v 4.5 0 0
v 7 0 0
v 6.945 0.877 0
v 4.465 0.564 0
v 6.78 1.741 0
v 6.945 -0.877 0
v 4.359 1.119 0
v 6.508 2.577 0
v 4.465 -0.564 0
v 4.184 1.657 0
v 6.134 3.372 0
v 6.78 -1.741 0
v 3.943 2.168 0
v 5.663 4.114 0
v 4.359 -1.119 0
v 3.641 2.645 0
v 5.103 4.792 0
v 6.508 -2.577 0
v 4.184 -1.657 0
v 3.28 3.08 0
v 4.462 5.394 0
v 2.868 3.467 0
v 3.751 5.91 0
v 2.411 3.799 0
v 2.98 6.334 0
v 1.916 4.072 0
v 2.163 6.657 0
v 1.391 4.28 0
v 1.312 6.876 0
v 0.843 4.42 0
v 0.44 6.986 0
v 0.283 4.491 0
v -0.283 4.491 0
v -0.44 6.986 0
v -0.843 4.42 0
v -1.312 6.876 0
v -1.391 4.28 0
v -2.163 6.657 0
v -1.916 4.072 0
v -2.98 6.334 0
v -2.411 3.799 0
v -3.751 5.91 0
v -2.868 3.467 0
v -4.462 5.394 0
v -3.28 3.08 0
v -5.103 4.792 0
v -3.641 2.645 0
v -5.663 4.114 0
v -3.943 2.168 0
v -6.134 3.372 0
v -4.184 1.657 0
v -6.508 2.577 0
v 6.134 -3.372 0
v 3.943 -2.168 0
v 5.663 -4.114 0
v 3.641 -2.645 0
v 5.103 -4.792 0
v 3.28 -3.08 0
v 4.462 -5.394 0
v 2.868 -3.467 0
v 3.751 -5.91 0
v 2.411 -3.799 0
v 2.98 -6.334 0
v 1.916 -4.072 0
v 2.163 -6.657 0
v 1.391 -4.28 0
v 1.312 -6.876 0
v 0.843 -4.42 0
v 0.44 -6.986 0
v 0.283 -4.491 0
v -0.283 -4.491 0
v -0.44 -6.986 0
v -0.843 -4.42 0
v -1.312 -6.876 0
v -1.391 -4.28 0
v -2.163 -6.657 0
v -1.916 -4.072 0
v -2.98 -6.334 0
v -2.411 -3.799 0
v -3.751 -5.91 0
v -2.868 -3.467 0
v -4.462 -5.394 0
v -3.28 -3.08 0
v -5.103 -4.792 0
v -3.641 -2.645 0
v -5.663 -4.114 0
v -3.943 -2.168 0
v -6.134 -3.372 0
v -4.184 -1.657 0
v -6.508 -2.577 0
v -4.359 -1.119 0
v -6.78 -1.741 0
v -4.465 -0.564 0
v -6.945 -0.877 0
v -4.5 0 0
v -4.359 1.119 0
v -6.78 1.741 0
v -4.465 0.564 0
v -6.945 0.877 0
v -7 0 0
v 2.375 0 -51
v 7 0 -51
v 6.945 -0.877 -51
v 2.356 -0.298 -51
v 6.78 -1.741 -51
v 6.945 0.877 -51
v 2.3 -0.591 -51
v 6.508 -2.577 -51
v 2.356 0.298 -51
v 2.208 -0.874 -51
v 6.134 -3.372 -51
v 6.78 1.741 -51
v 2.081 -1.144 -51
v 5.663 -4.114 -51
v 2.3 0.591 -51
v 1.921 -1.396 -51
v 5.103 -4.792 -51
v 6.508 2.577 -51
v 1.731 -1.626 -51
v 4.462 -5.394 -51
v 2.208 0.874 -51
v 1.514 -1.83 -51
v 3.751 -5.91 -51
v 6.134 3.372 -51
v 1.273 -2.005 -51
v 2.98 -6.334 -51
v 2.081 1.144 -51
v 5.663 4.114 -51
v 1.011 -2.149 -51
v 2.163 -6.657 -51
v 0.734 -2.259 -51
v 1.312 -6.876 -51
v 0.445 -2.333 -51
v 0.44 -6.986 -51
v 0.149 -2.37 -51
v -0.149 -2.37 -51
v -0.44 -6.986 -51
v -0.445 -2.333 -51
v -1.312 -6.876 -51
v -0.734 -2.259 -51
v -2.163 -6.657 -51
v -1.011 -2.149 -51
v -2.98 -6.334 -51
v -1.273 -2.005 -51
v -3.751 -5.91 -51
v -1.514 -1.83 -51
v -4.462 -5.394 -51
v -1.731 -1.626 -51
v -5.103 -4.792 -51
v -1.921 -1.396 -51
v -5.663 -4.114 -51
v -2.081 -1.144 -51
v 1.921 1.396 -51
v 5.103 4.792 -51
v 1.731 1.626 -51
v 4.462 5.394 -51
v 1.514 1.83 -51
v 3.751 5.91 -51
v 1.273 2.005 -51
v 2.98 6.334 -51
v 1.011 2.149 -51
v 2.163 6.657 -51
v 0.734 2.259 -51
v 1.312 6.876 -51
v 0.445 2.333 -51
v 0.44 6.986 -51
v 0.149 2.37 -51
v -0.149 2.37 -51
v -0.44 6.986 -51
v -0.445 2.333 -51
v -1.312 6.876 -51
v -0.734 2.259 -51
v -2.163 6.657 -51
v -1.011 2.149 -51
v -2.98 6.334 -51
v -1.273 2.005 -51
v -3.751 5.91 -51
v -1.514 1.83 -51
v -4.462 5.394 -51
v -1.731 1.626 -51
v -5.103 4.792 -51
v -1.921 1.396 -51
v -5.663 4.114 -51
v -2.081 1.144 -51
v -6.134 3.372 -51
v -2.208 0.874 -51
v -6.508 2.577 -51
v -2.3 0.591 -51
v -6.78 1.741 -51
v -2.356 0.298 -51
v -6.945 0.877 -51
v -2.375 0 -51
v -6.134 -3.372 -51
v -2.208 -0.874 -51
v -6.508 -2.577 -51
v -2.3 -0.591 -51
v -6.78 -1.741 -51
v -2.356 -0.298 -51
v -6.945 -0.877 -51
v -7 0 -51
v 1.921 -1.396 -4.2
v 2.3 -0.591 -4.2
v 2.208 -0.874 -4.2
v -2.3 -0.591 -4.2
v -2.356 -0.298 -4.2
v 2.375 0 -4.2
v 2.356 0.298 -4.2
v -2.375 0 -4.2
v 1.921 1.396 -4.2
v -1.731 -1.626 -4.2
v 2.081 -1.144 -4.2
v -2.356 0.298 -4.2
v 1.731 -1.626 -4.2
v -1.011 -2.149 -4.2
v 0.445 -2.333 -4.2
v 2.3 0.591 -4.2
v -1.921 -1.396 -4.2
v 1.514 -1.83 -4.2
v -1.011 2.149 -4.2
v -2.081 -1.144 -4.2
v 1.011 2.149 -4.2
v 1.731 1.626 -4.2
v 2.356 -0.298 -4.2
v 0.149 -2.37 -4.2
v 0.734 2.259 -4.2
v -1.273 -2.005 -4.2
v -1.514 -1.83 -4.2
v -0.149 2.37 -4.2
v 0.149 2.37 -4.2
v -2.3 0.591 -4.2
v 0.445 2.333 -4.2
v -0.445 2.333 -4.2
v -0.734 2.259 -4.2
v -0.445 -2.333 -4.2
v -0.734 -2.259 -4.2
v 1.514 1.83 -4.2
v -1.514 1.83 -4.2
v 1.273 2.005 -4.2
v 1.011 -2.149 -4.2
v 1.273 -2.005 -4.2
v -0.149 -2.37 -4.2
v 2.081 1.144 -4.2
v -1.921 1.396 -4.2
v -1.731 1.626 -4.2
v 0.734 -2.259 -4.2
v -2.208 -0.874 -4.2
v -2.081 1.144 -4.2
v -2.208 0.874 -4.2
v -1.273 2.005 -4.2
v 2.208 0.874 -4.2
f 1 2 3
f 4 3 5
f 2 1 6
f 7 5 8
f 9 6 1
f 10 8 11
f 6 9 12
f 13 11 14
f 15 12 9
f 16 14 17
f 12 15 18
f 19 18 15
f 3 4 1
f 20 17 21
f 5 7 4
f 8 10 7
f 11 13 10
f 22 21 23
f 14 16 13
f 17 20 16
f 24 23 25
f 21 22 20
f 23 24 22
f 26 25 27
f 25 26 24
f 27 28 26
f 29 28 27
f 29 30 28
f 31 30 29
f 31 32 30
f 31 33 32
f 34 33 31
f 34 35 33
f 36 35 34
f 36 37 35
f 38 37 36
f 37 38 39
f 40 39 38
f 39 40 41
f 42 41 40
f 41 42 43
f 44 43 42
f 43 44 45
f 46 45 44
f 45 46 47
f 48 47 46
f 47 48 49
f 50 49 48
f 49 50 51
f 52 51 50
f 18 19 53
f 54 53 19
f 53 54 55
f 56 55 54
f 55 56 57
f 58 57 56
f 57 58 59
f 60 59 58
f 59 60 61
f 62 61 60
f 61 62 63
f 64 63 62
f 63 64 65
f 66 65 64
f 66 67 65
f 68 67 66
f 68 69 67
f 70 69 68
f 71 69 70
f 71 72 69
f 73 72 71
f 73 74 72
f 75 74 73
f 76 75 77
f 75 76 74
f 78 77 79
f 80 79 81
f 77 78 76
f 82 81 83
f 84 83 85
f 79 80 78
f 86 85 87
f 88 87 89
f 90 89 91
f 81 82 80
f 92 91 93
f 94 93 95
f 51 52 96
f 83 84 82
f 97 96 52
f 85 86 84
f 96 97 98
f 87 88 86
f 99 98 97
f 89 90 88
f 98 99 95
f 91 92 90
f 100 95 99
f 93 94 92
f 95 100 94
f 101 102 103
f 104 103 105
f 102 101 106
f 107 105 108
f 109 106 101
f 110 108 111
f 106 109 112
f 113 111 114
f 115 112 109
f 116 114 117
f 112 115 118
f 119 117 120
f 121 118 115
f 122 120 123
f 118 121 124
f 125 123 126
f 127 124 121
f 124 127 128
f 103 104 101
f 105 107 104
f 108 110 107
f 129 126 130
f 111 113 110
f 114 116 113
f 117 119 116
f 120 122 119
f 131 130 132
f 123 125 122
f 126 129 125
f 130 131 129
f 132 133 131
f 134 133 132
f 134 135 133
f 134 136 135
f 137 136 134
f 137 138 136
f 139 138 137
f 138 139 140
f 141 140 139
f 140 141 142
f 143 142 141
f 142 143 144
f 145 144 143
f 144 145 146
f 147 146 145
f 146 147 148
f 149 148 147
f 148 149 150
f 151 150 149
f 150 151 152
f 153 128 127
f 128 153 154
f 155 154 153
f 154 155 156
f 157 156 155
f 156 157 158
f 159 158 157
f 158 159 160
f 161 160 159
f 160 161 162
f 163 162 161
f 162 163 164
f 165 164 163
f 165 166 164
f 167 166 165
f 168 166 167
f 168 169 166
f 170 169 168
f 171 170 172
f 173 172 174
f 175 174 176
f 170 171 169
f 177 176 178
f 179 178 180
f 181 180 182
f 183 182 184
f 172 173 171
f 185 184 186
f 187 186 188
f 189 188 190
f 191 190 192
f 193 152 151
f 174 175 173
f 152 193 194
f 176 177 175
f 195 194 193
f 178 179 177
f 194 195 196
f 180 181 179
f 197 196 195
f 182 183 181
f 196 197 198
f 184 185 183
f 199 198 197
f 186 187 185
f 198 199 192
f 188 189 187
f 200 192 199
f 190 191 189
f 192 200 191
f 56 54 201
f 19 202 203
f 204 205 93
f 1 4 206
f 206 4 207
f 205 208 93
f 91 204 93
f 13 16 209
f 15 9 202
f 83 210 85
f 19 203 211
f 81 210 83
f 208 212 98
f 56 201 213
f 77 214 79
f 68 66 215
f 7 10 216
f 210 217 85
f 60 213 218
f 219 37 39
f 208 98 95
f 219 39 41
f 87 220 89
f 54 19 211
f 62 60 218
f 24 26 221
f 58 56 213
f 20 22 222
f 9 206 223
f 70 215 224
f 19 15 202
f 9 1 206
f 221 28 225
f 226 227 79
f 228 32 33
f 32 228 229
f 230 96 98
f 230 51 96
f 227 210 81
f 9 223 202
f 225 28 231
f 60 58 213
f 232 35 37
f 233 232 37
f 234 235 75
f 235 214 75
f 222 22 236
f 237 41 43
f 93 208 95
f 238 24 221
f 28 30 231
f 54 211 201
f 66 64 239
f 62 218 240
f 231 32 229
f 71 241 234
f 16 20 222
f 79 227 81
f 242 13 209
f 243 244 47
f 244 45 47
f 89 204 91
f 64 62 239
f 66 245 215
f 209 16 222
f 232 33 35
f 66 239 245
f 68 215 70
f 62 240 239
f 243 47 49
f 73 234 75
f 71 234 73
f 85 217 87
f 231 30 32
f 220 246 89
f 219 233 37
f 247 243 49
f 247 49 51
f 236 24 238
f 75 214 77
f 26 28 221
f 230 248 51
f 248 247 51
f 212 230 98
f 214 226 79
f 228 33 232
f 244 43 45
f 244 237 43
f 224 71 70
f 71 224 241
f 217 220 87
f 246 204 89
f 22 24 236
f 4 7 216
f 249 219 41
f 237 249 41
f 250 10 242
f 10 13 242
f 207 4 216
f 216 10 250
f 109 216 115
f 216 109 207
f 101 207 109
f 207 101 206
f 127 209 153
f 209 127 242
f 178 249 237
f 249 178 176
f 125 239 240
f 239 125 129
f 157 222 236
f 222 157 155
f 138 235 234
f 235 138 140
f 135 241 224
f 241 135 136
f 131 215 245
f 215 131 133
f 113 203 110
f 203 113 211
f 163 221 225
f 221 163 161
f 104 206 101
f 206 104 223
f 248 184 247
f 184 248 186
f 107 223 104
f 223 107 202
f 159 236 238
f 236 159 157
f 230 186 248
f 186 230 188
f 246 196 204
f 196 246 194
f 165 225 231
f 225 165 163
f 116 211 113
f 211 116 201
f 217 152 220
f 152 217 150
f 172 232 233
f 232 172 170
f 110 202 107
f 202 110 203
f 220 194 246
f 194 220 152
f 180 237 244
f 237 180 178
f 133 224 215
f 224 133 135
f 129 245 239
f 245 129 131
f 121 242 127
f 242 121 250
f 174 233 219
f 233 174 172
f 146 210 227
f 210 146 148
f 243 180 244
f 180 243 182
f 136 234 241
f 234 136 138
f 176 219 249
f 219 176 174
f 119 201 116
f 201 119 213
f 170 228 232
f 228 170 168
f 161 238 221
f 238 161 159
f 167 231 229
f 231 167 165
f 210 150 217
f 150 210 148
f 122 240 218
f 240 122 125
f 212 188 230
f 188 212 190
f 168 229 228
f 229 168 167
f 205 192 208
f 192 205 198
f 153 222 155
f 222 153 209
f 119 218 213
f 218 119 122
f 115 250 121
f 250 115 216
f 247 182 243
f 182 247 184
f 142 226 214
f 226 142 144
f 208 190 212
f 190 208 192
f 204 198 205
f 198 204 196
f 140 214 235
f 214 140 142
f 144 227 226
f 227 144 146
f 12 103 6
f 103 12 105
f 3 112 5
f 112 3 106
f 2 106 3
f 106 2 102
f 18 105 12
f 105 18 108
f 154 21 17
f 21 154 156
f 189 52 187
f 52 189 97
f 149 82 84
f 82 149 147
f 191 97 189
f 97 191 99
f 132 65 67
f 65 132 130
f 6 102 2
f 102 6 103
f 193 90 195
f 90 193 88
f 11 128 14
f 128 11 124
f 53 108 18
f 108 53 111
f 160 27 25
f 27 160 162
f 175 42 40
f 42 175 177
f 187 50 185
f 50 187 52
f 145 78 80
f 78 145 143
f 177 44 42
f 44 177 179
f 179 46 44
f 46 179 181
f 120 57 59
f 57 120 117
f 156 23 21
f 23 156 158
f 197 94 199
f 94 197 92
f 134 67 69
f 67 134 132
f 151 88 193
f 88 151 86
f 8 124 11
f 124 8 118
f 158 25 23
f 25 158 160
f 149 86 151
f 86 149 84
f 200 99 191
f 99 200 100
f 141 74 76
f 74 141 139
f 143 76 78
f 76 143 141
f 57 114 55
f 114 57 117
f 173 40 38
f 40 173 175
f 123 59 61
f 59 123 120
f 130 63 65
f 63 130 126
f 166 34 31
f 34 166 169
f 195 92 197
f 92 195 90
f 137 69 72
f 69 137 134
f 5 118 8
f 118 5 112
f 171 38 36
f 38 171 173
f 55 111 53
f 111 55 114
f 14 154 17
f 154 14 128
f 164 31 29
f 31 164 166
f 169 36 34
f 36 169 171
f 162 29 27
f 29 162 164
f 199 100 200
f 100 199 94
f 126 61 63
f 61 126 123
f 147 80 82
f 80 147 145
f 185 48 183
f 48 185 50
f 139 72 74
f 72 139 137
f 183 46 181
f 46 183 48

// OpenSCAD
$fn = 50;


difference() {
	union() {
		translate(v = [0, 0, -51.0000000000]) {
			cylinder(h = 51, r = 7.0000000000);
		}
	}
	union() {
		translate(v = [0, 0, 0]) {
			rotate(a = [0, 0, 0]) {
				difference() {
					union() {
						#translate(v = [0, 0, -51.0000000000]) {
							cylinder(h = 51, r = 2.2500000000);
						}
						#translate(v = [0, 0, -4.2000000000]) {
							cylinder(h = 4.2000000000, r = 7.0000000000, r1 = 2.3750000000, r2 = 4.5000000000);
						}
						#translate(v = [0, 0, -51.0000000000]) {
							cylinder(h = 51, r = 2.3750000000);
						}
						#translate(v = [0, 0, -51.0000000000]) {
							cylinder(h = 51, r = 2.2500000000);
						}
					}
					union();
				}
			}
		}
	}
}
